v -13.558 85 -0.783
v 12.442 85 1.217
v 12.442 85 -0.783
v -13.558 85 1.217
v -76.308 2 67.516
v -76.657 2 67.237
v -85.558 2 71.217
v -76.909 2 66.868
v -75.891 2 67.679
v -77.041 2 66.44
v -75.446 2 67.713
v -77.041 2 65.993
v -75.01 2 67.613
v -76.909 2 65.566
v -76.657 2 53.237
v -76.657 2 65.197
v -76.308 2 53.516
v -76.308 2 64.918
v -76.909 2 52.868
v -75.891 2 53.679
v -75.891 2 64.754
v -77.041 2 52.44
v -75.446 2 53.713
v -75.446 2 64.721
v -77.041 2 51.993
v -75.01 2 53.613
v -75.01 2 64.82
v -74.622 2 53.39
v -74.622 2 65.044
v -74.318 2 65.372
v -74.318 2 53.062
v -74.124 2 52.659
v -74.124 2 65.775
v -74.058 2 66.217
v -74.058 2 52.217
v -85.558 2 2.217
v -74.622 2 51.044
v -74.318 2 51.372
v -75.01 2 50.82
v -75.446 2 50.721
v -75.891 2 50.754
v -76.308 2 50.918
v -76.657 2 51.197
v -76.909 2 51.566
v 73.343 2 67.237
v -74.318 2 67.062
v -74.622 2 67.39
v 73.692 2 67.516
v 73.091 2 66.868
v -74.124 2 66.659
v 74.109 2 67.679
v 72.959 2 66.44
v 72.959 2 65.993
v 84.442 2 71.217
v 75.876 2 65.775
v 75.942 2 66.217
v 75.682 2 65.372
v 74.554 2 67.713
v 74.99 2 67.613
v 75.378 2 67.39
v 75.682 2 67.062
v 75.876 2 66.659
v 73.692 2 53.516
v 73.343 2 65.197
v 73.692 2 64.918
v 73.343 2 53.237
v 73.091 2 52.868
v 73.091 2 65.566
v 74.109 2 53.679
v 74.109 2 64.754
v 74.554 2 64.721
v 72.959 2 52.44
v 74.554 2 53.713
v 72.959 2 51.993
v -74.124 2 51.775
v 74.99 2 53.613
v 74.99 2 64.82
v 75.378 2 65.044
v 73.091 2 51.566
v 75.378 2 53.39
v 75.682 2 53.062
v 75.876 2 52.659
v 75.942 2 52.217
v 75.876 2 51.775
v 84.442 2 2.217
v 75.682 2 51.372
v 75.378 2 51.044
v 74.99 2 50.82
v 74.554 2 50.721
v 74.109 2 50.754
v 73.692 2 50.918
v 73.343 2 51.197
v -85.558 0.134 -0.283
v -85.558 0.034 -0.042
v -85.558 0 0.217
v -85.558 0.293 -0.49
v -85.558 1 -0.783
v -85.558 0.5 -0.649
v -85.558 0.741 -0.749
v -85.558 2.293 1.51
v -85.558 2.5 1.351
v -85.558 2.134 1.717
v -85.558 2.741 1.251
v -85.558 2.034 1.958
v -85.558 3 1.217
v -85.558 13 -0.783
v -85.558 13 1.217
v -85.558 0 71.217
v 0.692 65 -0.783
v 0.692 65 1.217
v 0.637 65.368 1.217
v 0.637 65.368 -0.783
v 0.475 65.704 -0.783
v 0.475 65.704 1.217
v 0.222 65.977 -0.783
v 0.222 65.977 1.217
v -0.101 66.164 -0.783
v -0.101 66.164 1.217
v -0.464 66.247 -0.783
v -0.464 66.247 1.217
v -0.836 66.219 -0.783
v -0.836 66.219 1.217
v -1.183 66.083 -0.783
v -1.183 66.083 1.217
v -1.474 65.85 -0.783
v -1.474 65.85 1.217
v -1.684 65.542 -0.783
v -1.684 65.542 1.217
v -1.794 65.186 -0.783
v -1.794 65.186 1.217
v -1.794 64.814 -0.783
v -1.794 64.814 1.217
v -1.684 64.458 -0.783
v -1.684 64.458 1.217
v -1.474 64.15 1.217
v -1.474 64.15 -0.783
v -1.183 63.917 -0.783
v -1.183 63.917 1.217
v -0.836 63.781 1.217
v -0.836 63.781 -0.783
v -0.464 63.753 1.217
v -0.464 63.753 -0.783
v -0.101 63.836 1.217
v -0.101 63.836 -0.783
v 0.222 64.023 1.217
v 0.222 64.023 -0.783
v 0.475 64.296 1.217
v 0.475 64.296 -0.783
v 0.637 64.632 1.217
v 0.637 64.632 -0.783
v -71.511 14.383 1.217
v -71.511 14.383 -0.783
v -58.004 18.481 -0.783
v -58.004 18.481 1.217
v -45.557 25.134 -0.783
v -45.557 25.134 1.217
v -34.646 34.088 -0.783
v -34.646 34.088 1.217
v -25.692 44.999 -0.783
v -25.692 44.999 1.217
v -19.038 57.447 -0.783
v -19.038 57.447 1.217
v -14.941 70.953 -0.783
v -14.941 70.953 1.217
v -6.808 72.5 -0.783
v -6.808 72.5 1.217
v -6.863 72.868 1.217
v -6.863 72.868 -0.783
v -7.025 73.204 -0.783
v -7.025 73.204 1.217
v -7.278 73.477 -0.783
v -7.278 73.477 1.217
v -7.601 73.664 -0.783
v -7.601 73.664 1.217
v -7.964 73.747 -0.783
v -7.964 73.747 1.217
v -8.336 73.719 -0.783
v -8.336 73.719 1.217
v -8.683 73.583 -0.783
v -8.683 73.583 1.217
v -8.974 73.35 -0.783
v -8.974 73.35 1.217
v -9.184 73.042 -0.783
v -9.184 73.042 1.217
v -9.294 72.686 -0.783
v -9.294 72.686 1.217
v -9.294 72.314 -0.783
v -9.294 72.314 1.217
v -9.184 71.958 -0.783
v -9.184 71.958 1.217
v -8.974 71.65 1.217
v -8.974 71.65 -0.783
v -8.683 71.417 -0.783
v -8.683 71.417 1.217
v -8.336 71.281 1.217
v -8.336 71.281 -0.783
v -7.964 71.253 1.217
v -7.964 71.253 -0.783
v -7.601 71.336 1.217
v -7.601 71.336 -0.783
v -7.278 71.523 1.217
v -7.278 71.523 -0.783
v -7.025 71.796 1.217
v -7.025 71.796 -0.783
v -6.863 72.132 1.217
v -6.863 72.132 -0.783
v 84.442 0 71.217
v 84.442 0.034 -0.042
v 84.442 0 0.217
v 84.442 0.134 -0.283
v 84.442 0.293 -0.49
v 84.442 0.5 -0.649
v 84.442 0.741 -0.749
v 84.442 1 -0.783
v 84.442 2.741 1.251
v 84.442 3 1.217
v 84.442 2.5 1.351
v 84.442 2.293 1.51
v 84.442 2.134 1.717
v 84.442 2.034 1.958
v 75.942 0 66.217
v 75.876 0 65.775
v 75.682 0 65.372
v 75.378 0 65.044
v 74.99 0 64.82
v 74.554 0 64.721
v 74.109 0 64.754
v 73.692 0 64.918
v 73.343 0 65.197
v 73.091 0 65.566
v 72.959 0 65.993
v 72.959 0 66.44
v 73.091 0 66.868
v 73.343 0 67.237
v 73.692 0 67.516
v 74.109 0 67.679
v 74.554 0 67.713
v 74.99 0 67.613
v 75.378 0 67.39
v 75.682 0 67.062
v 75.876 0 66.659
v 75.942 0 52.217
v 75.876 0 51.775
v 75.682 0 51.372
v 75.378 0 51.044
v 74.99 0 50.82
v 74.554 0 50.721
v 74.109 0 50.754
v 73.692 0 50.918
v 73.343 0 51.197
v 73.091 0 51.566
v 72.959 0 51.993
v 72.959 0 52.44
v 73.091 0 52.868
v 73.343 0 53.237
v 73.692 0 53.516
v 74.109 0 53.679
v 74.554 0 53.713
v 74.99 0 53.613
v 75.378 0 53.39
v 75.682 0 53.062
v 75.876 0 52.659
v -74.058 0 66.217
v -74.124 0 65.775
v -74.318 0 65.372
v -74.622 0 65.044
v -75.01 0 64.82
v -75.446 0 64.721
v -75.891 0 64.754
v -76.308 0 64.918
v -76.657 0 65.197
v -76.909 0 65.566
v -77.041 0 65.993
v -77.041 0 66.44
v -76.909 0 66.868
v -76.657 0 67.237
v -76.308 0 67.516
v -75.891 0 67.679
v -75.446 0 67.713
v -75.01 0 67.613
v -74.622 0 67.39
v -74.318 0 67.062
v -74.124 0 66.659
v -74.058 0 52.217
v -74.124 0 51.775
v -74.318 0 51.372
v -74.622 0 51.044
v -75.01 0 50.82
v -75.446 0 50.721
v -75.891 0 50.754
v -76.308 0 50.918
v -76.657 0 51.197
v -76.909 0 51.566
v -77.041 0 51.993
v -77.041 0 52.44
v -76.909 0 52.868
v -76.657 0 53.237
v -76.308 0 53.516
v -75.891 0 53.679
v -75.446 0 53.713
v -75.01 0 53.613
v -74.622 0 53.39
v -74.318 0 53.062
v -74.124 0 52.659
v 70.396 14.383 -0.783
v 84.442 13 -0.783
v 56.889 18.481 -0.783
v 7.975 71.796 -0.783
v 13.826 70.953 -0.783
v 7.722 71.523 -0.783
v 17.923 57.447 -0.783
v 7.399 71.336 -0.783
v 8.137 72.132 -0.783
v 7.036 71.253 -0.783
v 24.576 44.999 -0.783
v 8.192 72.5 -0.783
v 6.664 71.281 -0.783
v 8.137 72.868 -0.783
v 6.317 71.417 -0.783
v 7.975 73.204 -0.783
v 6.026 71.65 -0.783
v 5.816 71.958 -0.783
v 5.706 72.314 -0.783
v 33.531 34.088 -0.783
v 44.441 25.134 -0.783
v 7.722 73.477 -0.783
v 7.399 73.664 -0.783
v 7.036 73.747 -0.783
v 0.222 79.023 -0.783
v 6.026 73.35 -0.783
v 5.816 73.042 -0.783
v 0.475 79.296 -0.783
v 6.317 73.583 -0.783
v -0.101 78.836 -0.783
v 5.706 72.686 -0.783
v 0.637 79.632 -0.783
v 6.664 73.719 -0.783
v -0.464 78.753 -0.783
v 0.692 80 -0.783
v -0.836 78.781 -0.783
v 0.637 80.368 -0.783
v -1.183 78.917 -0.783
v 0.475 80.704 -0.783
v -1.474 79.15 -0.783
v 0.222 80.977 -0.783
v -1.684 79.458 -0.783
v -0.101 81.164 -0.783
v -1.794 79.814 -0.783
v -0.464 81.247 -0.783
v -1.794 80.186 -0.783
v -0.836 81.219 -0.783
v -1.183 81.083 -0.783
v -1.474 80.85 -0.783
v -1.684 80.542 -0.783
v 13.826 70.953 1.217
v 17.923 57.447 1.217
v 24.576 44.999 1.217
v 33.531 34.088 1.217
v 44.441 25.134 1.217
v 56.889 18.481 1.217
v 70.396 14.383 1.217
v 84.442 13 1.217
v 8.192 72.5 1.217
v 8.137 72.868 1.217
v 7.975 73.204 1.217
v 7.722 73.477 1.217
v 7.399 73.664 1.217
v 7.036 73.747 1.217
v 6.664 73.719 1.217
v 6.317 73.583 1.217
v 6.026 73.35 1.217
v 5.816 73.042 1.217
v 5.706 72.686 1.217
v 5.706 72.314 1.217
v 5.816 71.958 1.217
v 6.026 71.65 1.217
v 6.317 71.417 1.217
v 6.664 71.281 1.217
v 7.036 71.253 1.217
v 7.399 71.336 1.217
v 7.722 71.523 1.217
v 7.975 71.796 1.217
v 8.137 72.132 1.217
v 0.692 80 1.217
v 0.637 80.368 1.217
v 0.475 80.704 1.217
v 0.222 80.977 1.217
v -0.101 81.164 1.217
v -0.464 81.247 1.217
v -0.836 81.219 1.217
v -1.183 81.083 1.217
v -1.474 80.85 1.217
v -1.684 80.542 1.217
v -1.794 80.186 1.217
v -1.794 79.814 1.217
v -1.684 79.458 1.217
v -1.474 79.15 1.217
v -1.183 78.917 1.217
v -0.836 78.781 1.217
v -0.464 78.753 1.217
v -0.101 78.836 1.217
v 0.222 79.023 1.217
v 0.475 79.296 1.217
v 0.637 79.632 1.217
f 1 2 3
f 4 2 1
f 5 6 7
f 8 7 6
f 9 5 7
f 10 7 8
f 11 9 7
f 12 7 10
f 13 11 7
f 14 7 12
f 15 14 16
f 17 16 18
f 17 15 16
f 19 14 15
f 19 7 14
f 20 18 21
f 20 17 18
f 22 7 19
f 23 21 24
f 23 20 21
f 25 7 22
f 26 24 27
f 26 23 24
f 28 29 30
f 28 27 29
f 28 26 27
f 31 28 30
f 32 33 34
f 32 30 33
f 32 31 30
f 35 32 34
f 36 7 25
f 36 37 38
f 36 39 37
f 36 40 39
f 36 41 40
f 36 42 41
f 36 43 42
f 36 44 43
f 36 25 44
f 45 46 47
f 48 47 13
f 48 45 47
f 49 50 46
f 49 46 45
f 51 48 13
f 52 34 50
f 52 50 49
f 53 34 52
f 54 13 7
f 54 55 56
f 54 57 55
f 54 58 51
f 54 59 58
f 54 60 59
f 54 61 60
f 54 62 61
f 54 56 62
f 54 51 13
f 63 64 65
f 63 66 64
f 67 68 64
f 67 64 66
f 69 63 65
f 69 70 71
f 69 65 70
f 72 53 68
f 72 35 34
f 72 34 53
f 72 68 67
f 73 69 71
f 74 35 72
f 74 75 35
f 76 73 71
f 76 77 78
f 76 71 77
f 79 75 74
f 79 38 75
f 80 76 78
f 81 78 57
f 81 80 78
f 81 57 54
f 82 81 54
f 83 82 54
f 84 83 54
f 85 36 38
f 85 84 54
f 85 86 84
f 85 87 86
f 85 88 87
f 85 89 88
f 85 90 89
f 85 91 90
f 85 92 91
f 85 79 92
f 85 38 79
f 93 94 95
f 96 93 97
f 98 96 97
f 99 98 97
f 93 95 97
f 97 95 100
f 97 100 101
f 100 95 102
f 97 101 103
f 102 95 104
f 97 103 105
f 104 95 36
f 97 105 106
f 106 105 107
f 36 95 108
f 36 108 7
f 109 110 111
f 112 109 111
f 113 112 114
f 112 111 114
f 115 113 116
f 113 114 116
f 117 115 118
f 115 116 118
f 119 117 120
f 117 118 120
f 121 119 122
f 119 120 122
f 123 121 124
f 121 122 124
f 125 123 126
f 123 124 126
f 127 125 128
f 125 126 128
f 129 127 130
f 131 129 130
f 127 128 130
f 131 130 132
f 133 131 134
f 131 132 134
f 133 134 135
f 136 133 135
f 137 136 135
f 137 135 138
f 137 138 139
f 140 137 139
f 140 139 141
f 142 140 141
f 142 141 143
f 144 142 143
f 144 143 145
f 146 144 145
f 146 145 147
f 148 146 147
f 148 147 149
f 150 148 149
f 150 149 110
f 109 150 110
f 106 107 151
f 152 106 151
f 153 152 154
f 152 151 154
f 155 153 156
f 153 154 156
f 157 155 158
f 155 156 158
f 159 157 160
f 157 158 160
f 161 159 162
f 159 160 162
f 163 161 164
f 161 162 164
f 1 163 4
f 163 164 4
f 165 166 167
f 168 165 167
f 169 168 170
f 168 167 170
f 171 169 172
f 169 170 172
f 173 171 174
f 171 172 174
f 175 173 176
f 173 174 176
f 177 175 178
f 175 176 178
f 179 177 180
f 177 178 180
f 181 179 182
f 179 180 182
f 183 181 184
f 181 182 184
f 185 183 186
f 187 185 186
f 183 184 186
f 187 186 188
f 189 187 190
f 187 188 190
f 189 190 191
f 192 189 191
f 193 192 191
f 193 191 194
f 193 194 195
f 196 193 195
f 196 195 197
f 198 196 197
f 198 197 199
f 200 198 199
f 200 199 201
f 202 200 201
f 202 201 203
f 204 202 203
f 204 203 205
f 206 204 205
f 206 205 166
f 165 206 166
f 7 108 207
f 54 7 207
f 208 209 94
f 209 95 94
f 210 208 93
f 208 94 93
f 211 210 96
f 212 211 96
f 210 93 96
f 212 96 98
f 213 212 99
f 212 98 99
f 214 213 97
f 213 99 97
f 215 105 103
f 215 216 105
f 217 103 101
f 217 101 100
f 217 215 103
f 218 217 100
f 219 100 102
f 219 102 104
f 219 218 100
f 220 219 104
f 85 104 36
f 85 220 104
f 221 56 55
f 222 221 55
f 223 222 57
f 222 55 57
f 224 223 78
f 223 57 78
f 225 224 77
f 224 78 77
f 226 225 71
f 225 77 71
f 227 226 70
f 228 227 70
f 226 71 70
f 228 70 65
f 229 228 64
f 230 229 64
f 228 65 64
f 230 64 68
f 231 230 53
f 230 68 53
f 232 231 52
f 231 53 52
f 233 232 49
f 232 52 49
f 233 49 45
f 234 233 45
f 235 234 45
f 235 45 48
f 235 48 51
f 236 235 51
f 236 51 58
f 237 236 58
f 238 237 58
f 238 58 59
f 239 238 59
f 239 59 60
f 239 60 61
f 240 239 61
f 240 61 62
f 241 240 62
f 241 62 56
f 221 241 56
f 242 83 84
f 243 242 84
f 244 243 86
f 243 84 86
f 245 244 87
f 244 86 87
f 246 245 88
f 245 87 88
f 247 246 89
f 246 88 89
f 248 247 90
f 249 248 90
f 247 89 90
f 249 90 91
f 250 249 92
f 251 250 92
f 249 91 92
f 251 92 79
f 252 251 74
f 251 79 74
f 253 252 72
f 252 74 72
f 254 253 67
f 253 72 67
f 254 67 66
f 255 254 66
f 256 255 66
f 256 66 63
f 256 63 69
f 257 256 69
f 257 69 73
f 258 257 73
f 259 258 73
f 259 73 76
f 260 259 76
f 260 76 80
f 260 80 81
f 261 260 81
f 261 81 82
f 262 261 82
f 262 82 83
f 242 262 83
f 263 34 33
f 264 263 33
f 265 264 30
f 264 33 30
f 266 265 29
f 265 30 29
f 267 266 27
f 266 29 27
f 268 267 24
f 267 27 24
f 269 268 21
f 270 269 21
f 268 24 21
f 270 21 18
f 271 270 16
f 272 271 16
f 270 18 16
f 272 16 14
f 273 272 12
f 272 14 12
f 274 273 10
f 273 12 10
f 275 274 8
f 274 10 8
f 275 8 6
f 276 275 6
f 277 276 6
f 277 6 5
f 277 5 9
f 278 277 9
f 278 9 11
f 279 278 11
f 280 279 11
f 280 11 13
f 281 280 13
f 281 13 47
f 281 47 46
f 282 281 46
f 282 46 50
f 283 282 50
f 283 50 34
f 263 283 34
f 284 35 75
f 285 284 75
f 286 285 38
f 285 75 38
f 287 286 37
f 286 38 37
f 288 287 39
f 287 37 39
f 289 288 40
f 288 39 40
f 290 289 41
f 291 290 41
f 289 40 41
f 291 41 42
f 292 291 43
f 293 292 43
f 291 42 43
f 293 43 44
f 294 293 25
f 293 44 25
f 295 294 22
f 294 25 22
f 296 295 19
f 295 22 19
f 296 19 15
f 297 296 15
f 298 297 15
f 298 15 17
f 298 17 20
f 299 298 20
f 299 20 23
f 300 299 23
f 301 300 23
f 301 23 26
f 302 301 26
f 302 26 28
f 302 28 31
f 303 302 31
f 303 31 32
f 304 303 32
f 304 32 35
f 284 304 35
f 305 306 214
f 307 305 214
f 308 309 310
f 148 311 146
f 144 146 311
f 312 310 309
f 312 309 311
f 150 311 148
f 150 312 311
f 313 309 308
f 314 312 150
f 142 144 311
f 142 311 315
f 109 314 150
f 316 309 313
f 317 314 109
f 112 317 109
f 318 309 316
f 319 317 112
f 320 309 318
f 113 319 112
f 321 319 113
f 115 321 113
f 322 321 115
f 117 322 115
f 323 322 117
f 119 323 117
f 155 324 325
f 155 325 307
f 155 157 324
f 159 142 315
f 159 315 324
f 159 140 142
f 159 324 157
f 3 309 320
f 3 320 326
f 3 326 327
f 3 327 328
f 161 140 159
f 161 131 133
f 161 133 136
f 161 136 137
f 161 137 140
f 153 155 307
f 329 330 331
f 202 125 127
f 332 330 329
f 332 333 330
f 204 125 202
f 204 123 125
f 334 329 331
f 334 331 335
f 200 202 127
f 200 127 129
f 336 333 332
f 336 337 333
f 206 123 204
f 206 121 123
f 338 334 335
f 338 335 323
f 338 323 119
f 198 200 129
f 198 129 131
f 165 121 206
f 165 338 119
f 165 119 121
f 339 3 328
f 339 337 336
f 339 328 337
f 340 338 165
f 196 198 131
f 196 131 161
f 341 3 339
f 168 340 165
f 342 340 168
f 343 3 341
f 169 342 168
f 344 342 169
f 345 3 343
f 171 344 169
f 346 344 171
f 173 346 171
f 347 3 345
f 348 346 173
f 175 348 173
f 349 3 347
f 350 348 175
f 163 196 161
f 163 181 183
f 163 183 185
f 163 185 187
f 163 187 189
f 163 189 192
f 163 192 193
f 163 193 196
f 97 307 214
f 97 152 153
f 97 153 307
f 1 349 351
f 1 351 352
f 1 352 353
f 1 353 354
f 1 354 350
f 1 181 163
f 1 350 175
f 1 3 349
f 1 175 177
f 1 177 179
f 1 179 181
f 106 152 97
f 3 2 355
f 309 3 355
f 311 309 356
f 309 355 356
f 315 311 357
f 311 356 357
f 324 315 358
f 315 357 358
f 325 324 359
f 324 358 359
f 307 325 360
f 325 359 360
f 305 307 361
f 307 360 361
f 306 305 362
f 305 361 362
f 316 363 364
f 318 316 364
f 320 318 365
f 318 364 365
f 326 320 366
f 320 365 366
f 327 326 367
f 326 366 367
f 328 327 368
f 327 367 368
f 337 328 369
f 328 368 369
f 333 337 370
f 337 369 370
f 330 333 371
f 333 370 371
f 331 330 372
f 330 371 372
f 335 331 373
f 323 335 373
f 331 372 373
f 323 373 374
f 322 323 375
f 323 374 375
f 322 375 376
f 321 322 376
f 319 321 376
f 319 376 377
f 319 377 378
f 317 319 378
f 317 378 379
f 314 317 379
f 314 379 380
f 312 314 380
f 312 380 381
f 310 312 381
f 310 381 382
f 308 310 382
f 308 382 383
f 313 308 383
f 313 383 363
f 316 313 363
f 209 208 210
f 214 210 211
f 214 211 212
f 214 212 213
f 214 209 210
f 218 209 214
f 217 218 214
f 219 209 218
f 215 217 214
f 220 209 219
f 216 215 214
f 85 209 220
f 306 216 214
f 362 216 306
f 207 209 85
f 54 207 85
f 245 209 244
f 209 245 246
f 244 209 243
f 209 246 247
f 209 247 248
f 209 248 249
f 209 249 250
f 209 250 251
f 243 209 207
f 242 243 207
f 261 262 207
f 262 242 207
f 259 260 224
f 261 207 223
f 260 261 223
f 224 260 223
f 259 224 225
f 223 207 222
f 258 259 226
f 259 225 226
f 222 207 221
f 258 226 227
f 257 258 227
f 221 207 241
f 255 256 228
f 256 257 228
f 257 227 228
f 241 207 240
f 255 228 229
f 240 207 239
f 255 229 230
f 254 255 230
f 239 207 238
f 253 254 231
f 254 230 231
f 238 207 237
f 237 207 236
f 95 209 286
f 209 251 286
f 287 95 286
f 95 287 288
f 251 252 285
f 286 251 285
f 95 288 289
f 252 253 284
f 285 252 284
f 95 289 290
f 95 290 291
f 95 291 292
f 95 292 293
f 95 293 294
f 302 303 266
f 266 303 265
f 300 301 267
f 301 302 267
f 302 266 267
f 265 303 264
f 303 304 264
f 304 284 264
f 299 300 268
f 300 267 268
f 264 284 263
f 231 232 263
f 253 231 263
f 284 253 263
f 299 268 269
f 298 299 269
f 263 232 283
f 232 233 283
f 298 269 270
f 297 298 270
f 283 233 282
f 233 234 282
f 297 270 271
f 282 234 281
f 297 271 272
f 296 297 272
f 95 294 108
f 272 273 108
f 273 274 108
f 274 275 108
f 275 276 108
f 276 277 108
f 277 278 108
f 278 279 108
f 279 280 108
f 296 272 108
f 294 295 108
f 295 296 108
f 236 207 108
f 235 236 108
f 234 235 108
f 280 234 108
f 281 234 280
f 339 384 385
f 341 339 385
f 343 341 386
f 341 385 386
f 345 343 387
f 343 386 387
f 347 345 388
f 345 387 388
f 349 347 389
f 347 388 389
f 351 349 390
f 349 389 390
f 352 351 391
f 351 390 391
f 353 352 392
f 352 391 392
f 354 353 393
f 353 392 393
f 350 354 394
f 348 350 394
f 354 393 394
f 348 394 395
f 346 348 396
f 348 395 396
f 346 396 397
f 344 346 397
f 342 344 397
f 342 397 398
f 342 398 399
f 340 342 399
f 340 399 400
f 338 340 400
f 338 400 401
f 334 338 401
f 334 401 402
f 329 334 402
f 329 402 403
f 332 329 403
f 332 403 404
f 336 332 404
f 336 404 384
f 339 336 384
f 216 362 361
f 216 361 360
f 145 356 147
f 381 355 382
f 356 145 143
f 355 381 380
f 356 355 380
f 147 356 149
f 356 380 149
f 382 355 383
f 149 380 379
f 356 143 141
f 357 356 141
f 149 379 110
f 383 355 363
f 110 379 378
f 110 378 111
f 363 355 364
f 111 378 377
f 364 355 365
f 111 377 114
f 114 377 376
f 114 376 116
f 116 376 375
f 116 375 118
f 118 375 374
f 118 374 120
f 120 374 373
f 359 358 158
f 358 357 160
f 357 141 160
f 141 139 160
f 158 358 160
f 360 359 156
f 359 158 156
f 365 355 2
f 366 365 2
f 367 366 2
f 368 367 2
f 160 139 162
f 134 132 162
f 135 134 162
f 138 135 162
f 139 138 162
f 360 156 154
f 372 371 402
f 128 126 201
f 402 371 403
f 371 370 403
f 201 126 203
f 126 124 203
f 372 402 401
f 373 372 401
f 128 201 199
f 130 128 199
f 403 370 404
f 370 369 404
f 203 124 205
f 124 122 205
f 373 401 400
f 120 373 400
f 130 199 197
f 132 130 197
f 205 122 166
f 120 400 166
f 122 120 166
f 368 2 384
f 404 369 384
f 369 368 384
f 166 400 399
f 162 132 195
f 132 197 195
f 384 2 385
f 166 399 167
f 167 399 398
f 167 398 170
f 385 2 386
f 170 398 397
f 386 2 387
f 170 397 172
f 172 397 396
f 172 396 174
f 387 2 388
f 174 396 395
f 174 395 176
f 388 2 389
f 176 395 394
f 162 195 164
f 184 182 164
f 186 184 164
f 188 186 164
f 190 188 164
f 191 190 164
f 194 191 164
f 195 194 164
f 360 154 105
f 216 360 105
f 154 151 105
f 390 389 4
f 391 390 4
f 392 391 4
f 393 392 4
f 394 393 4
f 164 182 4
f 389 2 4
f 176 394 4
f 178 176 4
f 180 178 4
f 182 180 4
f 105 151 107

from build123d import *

# Parameters (mm, degrees)
SKETCH1_W               = 170
SKETCH1_H               = 70
BOSS_EXTRUDE1_DEPTH     = 2
CUT_EXTRUDE1_DEPTH      = 22
CUT_EXTRUDE1_DEPTH_BACK = 22
SKETCH2_R               = 1.5
SKETCH4_W               = 170
SKETCH4_H               = 85
BOSS_EXTRUDE2_DEPTH     = 2
FILLET2_R               = 1
FILLET3_R               = 1
CUT_EXTRUDE3_DEPTH      = 12
CUT_EXTRUDE3_DEPTH_BACK = 12
SKETCH6_R               = 1.25
CUT_EXTRUDE4_DEPTH      = 12
CUT_EXTRUDE4_DEPTH_BACK = 12
SKETCH5_R               = 72


with BuildPart() as part:
    # Sketch1 → Boss-Extrude1 (new body)
    with BuildSketch(Plane(origin=(0, 0, 0), x_dir=(1, 0, 0), z_dir=(0, 1, 0))):
        with Locations((-0.557701395, -36.216789823)):
            Rectangle(SKETCH1_W, SKETCH1_H)
    extrude(amount=BOSS_EXTRUDE1_DEPTH)

    # Sketch2 → Cut-Extrude1 (cut, two sides: drawn at the far end of the back side and taken through both)
    with BuildSketch(Plane(origin=(0, 2, 0), x_dir=(1, 0, 0), z_dir=(0, 1, 0)).offset(-CUT_EXTRUDE1_DEPTH_BACK)):
        with Locations((-75.557701395, -52.216789823)):
            Circle(SKETCH2_R)
        with Locations((-75.557701395, -66.216789823)):
            Circle(SKETCH2_R)
        with Locations((74.442298605, -52.216789823)):
            Circle(SKETCH2_R)
        with Locations((74.442298605, -66.216789823)):
            Circle(SKETCH2_R)
    extrude(amount=CUT_EXTRUDE1_DEPTH + CUT_EXTRUDE1_DEPTH_BACK, mode=Mode.SUBTRACT)

    # Sketch4 → Boss-Extrude2 (add)
    with BuildSketch(Plane(origin=(0, 0, 1.216789823), x_dir=(-1, 0, 0), z_dir=(0, 0, -1))):
        with Locations((0.557701395, 42.5)):
            Rectangle(SKETCH4_W, SKETCH4_H)
    extrude(amount=BOSS_EXTRUDE2_DEPTH)

    # Fillet2
    fillet2_edges = [part.edges().sort_by_distance(p)[0] for p in [
        (-0.557701395, 0, -0.783210177),
    ]]
    fillet(fillet2_edges, radius=FILLET2_R)

    # Fillet3
    fillet3_edges = [part.edges().sort_by_distance(p)[0] for p in [
        (-0.557701395, 2, 1.216789823),
    ]]
    fillet(fillet3_edges, radius=FILLET3_R)

    # Sketch6 → Cut-Extrude3 (cut, two sides: drawn at the far end of the back side and taken through both)
    with BuildSketch(Plane.XY.offset(1.216789823).offset(-CUT_EXTRUDE3_DEPTH_BACK)):
        with Locations((-0.557701395, 80)):
            Circle(SKETCH6_R)
        with Locations((-0.557701395, 65)):
            Circle(SKETCH6_R)
        with Locations((6.942298605, 72.5)):
            Circle(SKETCH6_R)
        with Locations((-8.057701395, 72.5)):
            Circle(SKETCH6_R)
    extrude(amount=CUT_EXTRUDE3_DEPTH + CUT_EXTRUDE3_DEPTH_BACK, mode=Mode.SUBTRACT)

    # Sketch5 → Cut-Extrude4 (cut, two sides: drawn at the far end of the back side and taken through both)
    with BuildSketch(Plane.XY.offset(1.216789823).offset(-CUT_EXTRUDE4_DEPTH_BACK)):
        with Locations((-85.557701395, 85)):
            Circle(SKETCH5_R)
        with Locations((84.442298605, 85)):
            Circle(SKETCH5_R)
    extrude(amount=CUT_EXTRUDE4_DEPTH + CUT_EXTRUDE4_DEPTH_BACK, mode=Mode.SUBTRACT)


solid = part.part
